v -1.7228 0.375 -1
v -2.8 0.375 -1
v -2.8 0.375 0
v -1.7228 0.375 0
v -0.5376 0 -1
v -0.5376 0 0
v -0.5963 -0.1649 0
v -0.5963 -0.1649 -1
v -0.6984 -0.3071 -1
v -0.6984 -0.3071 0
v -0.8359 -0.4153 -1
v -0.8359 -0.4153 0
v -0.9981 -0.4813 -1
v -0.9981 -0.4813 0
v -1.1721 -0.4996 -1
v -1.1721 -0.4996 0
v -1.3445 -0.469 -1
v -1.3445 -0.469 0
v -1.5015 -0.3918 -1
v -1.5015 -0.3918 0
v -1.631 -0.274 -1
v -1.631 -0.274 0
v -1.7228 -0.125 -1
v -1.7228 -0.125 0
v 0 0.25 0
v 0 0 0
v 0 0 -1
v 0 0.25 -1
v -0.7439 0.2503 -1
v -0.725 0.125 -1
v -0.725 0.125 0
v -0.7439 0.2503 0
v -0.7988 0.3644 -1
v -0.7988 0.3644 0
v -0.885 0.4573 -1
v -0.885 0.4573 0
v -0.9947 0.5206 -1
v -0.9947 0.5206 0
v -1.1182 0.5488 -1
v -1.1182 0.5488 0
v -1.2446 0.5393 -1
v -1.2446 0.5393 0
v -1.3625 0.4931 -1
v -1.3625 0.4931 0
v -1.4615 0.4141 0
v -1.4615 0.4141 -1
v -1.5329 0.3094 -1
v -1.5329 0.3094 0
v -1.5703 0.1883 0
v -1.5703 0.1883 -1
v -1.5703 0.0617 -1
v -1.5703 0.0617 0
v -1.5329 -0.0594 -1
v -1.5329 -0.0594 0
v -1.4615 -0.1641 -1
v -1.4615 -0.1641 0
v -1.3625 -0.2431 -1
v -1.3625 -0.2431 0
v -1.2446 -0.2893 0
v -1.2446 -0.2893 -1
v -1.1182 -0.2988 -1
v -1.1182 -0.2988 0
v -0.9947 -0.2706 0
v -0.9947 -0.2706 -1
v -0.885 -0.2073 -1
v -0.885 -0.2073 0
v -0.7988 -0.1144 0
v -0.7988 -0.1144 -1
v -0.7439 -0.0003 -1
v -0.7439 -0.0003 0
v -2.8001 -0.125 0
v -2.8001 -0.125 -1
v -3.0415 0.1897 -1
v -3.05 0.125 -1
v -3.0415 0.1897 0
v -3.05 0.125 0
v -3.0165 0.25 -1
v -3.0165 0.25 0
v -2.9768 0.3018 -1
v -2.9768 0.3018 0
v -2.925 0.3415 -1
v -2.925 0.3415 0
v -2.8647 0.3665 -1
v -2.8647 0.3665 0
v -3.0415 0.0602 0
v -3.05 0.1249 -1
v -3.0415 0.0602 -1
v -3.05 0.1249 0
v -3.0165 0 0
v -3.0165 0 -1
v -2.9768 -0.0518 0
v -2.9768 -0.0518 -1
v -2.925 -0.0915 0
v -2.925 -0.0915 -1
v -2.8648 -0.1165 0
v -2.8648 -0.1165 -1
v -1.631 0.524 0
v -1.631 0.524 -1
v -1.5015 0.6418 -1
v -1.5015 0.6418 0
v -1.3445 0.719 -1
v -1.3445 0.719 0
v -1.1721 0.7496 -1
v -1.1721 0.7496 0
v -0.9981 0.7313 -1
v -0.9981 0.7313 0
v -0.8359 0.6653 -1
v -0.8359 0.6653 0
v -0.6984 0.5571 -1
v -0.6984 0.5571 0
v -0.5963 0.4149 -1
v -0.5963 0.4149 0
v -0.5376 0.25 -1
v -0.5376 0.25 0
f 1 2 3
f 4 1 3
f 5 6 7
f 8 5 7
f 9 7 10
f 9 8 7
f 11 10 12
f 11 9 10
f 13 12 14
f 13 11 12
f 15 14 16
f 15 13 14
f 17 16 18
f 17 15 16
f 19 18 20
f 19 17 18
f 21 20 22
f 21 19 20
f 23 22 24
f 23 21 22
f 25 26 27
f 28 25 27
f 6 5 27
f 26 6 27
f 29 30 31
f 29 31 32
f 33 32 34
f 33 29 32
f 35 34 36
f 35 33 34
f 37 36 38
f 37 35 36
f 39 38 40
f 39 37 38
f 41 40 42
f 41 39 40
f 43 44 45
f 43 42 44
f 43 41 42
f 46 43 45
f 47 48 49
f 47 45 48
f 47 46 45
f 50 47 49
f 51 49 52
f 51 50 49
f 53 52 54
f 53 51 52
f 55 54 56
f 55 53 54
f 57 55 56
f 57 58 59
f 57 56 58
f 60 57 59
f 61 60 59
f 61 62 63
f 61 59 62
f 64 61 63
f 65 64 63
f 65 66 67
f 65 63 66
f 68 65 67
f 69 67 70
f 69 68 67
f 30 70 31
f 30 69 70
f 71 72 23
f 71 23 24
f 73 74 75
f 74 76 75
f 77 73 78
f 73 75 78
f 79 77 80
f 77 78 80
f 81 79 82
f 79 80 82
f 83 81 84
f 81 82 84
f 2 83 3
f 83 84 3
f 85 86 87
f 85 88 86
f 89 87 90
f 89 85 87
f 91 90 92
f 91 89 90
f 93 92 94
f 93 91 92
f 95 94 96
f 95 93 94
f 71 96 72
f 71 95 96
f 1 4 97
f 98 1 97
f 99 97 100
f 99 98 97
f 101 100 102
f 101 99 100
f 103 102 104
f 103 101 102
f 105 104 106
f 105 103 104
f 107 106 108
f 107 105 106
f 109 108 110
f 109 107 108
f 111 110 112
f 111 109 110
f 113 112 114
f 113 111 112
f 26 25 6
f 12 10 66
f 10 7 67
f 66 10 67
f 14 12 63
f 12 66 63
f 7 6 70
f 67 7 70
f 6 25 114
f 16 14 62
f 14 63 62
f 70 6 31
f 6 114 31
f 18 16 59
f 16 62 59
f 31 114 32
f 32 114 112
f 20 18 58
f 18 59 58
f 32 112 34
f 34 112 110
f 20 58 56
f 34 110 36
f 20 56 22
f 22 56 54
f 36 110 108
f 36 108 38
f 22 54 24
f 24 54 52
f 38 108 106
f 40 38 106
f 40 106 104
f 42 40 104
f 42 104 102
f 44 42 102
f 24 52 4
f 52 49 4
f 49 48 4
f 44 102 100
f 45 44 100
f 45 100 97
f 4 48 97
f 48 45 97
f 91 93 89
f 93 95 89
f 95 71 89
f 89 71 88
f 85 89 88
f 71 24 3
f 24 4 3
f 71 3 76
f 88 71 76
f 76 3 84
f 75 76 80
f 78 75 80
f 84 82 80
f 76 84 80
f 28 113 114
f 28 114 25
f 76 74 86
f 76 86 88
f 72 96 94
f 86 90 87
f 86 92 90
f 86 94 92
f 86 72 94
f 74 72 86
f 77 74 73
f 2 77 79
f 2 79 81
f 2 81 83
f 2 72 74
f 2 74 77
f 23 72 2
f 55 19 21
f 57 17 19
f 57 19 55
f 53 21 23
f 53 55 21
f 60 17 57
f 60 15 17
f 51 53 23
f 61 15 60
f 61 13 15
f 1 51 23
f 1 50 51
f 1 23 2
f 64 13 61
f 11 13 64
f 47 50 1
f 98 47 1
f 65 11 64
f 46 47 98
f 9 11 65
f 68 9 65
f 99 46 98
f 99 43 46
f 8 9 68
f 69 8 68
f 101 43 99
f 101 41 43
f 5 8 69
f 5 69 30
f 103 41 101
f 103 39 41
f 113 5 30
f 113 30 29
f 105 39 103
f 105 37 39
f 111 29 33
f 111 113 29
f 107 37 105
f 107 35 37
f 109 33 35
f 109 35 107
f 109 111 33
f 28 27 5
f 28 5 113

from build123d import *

# Parameters (mm, degrees)
SKETCH1_W               = 1.15
SKETCH1_H               = 1
BOSS_EXTRUDE1_DEPTH     = 0.25
SKETCH2_W               = 1
SKETCH2_H               = 0.5
BOSS_EXTRUDE2_DEPTH     = 1.9
SKETCH3_R               = 0.625
BOSS_EXTRUDE3_DEPTH     = 1
CUT_EXTRUDE1_DEPTH      = 4.296209945
CUT_EXTRUDE1_DEPTH_BACK = 4.296209945
SKETCH4_R               = 0.425
FILLET2_R               = 0.25
FILLET3_R               = 0.25


with BuildPart() as part:
    # Sketch1 → Boss-Extrude1 (new body)
    with BuildSketch(Plane(origin=(0, 0, 0), x_dir=(1, 0, 0), z_dir=(0, 1, 0))):
        with Locations((-0.575, 0.5)):
            Rectangle(SKETCH1_W, SKETCH1_H)
    extrude(amount=BOSS_EXTRUDE1_DEPTH)

    # Sketch2 → Boss-Extrude2 (add)
    with BuildSketch(Plane.ZY.offset(1.15)):
        with Locations((-0.5, 0.125)):
            Rectangle(SKETCH2_W, SKETCH2_H)
    extrude(amount=BOSS_EXTRUDE2_DEPTH)

    # Sketch3 → Boss-Extrude3 (add)
    with BuildSketch(Plane(origin=(0, 0, -1), x_dir=(-1, 0, 0), z_dir=(0, 0, -1))):
        with Locations((1.15, 0.125)):
            Circle(SKETCH3_R)
    extrude(amount=-BOSS_EXTRUDE3_DEPTH)

    # Sketch4 → Cut-Extrude1 (cut, two sides: drawn at the far end of the back side and taken through both)
    with BuildSketch(Plane.XY.offset(-CUT_EXTRUDE1_DEPTH_BACK)):
        with Locations((-1.15, 0.125)):
            Circle(SKETCH4_R)
    extrude(amount=CUT_EXTRUDE1_DEPTH + CUT_EXTRUDE1_DEPTH_BACK, mode=Mode.SUBTRACT)

    # Fillet2
    fillet2_edges = [part.edges().sort_by_distance(p)[0] for p in [
        (-3.05, 0.375, -0.5),
    ]]
    fillet(fillet2_edges, radius=FILLET2_R)

    # Fillet3
    fillet3_edges = [part.edges().sort_by_distance(p)[0] for p in [
        (-3.05, -0.125, -0.5),
    ]]
    fillet(fillet3_edges, radius=FILLET3_R - 0.0001)  # a hair under: the kernel refuses the full size


solid = part.part
